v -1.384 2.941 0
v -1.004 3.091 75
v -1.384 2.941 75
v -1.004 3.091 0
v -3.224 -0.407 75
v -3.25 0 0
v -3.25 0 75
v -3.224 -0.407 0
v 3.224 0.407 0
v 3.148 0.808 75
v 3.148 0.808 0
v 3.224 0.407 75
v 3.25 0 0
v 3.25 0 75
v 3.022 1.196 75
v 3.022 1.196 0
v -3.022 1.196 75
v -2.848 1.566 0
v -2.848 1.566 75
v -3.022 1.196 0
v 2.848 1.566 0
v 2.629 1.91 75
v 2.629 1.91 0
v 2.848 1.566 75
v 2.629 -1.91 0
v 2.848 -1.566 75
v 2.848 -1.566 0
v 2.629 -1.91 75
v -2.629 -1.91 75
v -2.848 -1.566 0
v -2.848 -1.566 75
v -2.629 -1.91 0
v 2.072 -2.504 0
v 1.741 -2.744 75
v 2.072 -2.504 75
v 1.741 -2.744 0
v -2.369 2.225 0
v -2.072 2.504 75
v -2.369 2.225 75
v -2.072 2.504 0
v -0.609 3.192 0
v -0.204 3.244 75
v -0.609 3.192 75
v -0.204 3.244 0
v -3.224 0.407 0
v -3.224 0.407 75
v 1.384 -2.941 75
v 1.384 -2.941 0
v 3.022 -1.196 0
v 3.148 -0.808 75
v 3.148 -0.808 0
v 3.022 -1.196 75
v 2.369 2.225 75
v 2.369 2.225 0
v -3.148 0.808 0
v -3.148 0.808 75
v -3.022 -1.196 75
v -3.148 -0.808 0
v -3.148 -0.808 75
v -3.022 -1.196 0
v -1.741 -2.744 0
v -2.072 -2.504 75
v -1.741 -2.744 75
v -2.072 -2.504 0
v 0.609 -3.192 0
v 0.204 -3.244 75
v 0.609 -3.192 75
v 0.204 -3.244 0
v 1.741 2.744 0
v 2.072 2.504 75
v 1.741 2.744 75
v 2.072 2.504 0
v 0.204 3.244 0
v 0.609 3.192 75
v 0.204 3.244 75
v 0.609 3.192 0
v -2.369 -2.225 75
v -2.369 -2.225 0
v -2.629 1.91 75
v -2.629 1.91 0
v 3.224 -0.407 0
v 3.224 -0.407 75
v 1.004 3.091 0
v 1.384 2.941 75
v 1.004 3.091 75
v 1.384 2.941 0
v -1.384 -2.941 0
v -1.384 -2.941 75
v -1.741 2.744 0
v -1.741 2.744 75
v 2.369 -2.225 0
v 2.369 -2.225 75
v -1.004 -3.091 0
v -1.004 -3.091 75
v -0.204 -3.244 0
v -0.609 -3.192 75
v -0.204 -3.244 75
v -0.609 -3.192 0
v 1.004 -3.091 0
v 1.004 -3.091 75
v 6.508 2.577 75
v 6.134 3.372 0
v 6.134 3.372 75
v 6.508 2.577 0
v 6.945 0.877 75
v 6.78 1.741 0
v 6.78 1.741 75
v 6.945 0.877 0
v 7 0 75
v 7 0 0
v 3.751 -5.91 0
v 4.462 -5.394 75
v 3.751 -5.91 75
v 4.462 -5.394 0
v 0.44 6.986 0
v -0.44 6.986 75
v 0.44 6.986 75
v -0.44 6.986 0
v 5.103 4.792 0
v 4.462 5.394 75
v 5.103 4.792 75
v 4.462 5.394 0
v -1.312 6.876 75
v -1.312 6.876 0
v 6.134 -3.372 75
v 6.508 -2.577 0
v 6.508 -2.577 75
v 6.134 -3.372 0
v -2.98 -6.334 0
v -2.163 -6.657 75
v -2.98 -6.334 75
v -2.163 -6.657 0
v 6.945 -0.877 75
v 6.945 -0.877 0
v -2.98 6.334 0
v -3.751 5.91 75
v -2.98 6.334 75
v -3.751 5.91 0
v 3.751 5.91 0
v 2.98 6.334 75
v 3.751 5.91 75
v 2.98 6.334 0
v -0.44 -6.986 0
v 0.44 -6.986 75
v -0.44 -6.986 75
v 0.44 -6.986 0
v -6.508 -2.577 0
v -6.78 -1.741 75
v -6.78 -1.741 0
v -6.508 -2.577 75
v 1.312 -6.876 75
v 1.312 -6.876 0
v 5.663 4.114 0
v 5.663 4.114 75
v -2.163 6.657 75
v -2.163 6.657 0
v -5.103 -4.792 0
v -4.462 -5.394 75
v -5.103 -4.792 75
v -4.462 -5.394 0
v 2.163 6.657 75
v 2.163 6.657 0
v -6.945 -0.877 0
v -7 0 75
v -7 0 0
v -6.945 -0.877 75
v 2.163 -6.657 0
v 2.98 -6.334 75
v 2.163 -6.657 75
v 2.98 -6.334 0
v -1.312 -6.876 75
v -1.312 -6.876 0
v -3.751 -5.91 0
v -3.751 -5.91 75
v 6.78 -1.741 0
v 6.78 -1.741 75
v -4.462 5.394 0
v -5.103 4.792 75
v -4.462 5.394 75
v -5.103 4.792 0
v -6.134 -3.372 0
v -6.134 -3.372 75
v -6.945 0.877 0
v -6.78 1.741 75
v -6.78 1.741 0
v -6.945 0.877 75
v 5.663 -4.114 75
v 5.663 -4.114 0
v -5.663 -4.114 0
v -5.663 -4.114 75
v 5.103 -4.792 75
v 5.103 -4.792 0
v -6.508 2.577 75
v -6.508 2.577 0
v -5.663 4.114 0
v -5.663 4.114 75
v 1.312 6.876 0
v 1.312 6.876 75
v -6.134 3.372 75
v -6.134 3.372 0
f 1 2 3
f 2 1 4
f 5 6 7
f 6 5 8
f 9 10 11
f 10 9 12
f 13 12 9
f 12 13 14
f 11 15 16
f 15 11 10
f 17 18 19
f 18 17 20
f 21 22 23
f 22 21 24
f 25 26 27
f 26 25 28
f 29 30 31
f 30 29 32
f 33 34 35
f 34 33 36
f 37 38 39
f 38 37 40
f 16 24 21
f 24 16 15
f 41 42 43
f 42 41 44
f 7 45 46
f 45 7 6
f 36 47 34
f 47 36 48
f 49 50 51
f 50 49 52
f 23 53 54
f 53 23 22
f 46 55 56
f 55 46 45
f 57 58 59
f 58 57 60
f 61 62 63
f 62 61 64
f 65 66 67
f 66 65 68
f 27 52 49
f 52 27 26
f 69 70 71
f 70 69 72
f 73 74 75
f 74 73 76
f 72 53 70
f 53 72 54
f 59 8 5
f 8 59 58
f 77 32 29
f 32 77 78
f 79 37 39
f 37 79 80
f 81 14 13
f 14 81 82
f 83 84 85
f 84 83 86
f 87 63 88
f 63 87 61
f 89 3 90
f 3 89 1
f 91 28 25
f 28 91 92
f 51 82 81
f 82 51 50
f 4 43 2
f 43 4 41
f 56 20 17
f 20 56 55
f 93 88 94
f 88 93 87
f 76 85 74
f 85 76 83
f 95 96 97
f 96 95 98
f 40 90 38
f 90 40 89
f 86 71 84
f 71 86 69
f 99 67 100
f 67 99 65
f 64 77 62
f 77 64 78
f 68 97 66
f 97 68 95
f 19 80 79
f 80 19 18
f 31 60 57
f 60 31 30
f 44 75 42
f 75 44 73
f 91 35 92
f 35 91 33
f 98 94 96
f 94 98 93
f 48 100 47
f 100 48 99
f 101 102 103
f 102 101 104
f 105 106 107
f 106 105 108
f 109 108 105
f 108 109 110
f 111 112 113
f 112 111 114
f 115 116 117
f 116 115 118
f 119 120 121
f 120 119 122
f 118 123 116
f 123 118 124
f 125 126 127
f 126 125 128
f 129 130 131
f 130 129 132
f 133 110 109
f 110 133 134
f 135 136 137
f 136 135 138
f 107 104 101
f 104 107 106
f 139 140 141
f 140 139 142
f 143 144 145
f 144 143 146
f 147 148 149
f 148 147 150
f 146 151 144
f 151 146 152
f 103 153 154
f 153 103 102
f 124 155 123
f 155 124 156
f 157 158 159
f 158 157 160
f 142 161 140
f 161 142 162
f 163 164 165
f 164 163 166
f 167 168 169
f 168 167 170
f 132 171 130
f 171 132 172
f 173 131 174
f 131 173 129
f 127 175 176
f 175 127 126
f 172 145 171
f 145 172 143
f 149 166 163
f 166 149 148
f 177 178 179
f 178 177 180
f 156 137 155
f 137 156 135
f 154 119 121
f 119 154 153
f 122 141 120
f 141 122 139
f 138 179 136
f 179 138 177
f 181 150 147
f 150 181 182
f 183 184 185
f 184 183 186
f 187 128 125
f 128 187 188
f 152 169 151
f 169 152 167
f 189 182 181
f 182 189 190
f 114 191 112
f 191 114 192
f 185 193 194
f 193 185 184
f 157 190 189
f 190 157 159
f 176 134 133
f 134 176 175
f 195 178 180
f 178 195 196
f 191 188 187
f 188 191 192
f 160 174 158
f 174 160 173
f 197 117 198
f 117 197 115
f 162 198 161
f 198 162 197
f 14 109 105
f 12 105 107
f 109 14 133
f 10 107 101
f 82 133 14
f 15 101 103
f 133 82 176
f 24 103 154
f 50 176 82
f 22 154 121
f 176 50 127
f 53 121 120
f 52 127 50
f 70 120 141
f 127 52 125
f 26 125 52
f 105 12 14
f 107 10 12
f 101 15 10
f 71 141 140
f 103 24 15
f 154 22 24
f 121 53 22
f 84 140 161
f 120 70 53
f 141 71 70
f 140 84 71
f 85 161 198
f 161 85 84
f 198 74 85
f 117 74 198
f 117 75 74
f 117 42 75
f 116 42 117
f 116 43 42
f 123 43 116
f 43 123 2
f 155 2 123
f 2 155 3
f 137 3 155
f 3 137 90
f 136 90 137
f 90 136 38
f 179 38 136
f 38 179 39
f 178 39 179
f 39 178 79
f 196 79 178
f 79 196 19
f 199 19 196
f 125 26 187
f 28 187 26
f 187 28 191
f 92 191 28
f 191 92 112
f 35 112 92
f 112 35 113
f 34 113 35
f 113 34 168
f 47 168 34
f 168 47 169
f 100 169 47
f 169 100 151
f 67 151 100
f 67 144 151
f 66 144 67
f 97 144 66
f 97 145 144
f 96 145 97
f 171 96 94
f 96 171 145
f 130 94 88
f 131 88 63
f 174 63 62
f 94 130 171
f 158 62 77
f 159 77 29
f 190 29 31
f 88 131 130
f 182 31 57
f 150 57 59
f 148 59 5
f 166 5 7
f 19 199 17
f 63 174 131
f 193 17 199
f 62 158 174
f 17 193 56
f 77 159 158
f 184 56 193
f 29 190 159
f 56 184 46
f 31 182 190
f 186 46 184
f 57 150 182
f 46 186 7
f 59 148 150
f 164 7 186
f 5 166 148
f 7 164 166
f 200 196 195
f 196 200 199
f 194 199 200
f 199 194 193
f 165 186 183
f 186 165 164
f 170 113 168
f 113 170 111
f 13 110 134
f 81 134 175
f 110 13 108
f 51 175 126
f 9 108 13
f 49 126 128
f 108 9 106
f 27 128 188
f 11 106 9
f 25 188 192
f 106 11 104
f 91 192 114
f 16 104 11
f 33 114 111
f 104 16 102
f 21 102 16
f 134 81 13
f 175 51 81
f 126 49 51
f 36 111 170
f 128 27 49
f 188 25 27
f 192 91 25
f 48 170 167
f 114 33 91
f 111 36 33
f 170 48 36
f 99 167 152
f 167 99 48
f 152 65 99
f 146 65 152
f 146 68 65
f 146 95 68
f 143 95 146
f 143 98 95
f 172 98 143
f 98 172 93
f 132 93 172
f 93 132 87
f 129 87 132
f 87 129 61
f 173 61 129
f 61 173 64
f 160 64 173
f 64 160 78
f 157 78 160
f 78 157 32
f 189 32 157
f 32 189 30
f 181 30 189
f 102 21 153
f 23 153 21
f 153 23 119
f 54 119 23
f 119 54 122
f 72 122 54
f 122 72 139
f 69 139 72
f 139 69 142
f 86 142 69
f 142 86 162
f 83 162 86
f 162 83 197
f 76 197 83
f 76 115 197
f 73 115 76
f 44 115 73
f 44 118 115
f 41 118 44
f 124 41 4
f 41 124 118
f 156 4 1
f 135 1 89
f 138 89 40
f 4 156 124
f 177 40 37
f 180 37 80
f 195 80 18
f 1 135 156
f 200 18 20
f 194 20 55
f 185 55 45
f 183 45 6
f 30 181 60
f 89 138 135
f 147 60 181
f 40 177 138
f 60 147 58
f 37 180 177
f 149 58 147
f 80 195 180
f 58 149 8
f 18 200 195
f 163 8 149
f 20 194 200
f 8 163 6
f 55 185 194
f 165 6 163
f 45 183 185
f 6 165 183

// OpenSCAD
$fn = 50;


difference() {
	union() {
		*color(alpha = 1.0000000000, c = "gray") {
			translate(v = [0, 7, 0]) {
				linear_extrude(height = 1) {
					text(font = "Arial:style=Bold", halign = "center", size = 4.5000000000, text = "COMMENT plate main", valign = "center");
				}
			}
		}
		cylinder(h = 75, r = 7.0000000000);
	}
	union() {
		*color(alpha = 1.0000000000, c = "gray") {
			translate(v = [0, 7, 0]) {
				linear_extrude(height = 1) {
					text(font = "Arial:style=Bold", halign = "center", size = 4.5000000000, text = "COMMENT holes main", valign = "center");
				}
			}
		}
		translate(v = [0, 0, -100]) {
			cylinder(h = 200, r = 3.2500000000);
		}
		translate(v = [0, 0, -100]) {
			cylinder(h = 200, r = 1.8000000000);
		}
	}
}
